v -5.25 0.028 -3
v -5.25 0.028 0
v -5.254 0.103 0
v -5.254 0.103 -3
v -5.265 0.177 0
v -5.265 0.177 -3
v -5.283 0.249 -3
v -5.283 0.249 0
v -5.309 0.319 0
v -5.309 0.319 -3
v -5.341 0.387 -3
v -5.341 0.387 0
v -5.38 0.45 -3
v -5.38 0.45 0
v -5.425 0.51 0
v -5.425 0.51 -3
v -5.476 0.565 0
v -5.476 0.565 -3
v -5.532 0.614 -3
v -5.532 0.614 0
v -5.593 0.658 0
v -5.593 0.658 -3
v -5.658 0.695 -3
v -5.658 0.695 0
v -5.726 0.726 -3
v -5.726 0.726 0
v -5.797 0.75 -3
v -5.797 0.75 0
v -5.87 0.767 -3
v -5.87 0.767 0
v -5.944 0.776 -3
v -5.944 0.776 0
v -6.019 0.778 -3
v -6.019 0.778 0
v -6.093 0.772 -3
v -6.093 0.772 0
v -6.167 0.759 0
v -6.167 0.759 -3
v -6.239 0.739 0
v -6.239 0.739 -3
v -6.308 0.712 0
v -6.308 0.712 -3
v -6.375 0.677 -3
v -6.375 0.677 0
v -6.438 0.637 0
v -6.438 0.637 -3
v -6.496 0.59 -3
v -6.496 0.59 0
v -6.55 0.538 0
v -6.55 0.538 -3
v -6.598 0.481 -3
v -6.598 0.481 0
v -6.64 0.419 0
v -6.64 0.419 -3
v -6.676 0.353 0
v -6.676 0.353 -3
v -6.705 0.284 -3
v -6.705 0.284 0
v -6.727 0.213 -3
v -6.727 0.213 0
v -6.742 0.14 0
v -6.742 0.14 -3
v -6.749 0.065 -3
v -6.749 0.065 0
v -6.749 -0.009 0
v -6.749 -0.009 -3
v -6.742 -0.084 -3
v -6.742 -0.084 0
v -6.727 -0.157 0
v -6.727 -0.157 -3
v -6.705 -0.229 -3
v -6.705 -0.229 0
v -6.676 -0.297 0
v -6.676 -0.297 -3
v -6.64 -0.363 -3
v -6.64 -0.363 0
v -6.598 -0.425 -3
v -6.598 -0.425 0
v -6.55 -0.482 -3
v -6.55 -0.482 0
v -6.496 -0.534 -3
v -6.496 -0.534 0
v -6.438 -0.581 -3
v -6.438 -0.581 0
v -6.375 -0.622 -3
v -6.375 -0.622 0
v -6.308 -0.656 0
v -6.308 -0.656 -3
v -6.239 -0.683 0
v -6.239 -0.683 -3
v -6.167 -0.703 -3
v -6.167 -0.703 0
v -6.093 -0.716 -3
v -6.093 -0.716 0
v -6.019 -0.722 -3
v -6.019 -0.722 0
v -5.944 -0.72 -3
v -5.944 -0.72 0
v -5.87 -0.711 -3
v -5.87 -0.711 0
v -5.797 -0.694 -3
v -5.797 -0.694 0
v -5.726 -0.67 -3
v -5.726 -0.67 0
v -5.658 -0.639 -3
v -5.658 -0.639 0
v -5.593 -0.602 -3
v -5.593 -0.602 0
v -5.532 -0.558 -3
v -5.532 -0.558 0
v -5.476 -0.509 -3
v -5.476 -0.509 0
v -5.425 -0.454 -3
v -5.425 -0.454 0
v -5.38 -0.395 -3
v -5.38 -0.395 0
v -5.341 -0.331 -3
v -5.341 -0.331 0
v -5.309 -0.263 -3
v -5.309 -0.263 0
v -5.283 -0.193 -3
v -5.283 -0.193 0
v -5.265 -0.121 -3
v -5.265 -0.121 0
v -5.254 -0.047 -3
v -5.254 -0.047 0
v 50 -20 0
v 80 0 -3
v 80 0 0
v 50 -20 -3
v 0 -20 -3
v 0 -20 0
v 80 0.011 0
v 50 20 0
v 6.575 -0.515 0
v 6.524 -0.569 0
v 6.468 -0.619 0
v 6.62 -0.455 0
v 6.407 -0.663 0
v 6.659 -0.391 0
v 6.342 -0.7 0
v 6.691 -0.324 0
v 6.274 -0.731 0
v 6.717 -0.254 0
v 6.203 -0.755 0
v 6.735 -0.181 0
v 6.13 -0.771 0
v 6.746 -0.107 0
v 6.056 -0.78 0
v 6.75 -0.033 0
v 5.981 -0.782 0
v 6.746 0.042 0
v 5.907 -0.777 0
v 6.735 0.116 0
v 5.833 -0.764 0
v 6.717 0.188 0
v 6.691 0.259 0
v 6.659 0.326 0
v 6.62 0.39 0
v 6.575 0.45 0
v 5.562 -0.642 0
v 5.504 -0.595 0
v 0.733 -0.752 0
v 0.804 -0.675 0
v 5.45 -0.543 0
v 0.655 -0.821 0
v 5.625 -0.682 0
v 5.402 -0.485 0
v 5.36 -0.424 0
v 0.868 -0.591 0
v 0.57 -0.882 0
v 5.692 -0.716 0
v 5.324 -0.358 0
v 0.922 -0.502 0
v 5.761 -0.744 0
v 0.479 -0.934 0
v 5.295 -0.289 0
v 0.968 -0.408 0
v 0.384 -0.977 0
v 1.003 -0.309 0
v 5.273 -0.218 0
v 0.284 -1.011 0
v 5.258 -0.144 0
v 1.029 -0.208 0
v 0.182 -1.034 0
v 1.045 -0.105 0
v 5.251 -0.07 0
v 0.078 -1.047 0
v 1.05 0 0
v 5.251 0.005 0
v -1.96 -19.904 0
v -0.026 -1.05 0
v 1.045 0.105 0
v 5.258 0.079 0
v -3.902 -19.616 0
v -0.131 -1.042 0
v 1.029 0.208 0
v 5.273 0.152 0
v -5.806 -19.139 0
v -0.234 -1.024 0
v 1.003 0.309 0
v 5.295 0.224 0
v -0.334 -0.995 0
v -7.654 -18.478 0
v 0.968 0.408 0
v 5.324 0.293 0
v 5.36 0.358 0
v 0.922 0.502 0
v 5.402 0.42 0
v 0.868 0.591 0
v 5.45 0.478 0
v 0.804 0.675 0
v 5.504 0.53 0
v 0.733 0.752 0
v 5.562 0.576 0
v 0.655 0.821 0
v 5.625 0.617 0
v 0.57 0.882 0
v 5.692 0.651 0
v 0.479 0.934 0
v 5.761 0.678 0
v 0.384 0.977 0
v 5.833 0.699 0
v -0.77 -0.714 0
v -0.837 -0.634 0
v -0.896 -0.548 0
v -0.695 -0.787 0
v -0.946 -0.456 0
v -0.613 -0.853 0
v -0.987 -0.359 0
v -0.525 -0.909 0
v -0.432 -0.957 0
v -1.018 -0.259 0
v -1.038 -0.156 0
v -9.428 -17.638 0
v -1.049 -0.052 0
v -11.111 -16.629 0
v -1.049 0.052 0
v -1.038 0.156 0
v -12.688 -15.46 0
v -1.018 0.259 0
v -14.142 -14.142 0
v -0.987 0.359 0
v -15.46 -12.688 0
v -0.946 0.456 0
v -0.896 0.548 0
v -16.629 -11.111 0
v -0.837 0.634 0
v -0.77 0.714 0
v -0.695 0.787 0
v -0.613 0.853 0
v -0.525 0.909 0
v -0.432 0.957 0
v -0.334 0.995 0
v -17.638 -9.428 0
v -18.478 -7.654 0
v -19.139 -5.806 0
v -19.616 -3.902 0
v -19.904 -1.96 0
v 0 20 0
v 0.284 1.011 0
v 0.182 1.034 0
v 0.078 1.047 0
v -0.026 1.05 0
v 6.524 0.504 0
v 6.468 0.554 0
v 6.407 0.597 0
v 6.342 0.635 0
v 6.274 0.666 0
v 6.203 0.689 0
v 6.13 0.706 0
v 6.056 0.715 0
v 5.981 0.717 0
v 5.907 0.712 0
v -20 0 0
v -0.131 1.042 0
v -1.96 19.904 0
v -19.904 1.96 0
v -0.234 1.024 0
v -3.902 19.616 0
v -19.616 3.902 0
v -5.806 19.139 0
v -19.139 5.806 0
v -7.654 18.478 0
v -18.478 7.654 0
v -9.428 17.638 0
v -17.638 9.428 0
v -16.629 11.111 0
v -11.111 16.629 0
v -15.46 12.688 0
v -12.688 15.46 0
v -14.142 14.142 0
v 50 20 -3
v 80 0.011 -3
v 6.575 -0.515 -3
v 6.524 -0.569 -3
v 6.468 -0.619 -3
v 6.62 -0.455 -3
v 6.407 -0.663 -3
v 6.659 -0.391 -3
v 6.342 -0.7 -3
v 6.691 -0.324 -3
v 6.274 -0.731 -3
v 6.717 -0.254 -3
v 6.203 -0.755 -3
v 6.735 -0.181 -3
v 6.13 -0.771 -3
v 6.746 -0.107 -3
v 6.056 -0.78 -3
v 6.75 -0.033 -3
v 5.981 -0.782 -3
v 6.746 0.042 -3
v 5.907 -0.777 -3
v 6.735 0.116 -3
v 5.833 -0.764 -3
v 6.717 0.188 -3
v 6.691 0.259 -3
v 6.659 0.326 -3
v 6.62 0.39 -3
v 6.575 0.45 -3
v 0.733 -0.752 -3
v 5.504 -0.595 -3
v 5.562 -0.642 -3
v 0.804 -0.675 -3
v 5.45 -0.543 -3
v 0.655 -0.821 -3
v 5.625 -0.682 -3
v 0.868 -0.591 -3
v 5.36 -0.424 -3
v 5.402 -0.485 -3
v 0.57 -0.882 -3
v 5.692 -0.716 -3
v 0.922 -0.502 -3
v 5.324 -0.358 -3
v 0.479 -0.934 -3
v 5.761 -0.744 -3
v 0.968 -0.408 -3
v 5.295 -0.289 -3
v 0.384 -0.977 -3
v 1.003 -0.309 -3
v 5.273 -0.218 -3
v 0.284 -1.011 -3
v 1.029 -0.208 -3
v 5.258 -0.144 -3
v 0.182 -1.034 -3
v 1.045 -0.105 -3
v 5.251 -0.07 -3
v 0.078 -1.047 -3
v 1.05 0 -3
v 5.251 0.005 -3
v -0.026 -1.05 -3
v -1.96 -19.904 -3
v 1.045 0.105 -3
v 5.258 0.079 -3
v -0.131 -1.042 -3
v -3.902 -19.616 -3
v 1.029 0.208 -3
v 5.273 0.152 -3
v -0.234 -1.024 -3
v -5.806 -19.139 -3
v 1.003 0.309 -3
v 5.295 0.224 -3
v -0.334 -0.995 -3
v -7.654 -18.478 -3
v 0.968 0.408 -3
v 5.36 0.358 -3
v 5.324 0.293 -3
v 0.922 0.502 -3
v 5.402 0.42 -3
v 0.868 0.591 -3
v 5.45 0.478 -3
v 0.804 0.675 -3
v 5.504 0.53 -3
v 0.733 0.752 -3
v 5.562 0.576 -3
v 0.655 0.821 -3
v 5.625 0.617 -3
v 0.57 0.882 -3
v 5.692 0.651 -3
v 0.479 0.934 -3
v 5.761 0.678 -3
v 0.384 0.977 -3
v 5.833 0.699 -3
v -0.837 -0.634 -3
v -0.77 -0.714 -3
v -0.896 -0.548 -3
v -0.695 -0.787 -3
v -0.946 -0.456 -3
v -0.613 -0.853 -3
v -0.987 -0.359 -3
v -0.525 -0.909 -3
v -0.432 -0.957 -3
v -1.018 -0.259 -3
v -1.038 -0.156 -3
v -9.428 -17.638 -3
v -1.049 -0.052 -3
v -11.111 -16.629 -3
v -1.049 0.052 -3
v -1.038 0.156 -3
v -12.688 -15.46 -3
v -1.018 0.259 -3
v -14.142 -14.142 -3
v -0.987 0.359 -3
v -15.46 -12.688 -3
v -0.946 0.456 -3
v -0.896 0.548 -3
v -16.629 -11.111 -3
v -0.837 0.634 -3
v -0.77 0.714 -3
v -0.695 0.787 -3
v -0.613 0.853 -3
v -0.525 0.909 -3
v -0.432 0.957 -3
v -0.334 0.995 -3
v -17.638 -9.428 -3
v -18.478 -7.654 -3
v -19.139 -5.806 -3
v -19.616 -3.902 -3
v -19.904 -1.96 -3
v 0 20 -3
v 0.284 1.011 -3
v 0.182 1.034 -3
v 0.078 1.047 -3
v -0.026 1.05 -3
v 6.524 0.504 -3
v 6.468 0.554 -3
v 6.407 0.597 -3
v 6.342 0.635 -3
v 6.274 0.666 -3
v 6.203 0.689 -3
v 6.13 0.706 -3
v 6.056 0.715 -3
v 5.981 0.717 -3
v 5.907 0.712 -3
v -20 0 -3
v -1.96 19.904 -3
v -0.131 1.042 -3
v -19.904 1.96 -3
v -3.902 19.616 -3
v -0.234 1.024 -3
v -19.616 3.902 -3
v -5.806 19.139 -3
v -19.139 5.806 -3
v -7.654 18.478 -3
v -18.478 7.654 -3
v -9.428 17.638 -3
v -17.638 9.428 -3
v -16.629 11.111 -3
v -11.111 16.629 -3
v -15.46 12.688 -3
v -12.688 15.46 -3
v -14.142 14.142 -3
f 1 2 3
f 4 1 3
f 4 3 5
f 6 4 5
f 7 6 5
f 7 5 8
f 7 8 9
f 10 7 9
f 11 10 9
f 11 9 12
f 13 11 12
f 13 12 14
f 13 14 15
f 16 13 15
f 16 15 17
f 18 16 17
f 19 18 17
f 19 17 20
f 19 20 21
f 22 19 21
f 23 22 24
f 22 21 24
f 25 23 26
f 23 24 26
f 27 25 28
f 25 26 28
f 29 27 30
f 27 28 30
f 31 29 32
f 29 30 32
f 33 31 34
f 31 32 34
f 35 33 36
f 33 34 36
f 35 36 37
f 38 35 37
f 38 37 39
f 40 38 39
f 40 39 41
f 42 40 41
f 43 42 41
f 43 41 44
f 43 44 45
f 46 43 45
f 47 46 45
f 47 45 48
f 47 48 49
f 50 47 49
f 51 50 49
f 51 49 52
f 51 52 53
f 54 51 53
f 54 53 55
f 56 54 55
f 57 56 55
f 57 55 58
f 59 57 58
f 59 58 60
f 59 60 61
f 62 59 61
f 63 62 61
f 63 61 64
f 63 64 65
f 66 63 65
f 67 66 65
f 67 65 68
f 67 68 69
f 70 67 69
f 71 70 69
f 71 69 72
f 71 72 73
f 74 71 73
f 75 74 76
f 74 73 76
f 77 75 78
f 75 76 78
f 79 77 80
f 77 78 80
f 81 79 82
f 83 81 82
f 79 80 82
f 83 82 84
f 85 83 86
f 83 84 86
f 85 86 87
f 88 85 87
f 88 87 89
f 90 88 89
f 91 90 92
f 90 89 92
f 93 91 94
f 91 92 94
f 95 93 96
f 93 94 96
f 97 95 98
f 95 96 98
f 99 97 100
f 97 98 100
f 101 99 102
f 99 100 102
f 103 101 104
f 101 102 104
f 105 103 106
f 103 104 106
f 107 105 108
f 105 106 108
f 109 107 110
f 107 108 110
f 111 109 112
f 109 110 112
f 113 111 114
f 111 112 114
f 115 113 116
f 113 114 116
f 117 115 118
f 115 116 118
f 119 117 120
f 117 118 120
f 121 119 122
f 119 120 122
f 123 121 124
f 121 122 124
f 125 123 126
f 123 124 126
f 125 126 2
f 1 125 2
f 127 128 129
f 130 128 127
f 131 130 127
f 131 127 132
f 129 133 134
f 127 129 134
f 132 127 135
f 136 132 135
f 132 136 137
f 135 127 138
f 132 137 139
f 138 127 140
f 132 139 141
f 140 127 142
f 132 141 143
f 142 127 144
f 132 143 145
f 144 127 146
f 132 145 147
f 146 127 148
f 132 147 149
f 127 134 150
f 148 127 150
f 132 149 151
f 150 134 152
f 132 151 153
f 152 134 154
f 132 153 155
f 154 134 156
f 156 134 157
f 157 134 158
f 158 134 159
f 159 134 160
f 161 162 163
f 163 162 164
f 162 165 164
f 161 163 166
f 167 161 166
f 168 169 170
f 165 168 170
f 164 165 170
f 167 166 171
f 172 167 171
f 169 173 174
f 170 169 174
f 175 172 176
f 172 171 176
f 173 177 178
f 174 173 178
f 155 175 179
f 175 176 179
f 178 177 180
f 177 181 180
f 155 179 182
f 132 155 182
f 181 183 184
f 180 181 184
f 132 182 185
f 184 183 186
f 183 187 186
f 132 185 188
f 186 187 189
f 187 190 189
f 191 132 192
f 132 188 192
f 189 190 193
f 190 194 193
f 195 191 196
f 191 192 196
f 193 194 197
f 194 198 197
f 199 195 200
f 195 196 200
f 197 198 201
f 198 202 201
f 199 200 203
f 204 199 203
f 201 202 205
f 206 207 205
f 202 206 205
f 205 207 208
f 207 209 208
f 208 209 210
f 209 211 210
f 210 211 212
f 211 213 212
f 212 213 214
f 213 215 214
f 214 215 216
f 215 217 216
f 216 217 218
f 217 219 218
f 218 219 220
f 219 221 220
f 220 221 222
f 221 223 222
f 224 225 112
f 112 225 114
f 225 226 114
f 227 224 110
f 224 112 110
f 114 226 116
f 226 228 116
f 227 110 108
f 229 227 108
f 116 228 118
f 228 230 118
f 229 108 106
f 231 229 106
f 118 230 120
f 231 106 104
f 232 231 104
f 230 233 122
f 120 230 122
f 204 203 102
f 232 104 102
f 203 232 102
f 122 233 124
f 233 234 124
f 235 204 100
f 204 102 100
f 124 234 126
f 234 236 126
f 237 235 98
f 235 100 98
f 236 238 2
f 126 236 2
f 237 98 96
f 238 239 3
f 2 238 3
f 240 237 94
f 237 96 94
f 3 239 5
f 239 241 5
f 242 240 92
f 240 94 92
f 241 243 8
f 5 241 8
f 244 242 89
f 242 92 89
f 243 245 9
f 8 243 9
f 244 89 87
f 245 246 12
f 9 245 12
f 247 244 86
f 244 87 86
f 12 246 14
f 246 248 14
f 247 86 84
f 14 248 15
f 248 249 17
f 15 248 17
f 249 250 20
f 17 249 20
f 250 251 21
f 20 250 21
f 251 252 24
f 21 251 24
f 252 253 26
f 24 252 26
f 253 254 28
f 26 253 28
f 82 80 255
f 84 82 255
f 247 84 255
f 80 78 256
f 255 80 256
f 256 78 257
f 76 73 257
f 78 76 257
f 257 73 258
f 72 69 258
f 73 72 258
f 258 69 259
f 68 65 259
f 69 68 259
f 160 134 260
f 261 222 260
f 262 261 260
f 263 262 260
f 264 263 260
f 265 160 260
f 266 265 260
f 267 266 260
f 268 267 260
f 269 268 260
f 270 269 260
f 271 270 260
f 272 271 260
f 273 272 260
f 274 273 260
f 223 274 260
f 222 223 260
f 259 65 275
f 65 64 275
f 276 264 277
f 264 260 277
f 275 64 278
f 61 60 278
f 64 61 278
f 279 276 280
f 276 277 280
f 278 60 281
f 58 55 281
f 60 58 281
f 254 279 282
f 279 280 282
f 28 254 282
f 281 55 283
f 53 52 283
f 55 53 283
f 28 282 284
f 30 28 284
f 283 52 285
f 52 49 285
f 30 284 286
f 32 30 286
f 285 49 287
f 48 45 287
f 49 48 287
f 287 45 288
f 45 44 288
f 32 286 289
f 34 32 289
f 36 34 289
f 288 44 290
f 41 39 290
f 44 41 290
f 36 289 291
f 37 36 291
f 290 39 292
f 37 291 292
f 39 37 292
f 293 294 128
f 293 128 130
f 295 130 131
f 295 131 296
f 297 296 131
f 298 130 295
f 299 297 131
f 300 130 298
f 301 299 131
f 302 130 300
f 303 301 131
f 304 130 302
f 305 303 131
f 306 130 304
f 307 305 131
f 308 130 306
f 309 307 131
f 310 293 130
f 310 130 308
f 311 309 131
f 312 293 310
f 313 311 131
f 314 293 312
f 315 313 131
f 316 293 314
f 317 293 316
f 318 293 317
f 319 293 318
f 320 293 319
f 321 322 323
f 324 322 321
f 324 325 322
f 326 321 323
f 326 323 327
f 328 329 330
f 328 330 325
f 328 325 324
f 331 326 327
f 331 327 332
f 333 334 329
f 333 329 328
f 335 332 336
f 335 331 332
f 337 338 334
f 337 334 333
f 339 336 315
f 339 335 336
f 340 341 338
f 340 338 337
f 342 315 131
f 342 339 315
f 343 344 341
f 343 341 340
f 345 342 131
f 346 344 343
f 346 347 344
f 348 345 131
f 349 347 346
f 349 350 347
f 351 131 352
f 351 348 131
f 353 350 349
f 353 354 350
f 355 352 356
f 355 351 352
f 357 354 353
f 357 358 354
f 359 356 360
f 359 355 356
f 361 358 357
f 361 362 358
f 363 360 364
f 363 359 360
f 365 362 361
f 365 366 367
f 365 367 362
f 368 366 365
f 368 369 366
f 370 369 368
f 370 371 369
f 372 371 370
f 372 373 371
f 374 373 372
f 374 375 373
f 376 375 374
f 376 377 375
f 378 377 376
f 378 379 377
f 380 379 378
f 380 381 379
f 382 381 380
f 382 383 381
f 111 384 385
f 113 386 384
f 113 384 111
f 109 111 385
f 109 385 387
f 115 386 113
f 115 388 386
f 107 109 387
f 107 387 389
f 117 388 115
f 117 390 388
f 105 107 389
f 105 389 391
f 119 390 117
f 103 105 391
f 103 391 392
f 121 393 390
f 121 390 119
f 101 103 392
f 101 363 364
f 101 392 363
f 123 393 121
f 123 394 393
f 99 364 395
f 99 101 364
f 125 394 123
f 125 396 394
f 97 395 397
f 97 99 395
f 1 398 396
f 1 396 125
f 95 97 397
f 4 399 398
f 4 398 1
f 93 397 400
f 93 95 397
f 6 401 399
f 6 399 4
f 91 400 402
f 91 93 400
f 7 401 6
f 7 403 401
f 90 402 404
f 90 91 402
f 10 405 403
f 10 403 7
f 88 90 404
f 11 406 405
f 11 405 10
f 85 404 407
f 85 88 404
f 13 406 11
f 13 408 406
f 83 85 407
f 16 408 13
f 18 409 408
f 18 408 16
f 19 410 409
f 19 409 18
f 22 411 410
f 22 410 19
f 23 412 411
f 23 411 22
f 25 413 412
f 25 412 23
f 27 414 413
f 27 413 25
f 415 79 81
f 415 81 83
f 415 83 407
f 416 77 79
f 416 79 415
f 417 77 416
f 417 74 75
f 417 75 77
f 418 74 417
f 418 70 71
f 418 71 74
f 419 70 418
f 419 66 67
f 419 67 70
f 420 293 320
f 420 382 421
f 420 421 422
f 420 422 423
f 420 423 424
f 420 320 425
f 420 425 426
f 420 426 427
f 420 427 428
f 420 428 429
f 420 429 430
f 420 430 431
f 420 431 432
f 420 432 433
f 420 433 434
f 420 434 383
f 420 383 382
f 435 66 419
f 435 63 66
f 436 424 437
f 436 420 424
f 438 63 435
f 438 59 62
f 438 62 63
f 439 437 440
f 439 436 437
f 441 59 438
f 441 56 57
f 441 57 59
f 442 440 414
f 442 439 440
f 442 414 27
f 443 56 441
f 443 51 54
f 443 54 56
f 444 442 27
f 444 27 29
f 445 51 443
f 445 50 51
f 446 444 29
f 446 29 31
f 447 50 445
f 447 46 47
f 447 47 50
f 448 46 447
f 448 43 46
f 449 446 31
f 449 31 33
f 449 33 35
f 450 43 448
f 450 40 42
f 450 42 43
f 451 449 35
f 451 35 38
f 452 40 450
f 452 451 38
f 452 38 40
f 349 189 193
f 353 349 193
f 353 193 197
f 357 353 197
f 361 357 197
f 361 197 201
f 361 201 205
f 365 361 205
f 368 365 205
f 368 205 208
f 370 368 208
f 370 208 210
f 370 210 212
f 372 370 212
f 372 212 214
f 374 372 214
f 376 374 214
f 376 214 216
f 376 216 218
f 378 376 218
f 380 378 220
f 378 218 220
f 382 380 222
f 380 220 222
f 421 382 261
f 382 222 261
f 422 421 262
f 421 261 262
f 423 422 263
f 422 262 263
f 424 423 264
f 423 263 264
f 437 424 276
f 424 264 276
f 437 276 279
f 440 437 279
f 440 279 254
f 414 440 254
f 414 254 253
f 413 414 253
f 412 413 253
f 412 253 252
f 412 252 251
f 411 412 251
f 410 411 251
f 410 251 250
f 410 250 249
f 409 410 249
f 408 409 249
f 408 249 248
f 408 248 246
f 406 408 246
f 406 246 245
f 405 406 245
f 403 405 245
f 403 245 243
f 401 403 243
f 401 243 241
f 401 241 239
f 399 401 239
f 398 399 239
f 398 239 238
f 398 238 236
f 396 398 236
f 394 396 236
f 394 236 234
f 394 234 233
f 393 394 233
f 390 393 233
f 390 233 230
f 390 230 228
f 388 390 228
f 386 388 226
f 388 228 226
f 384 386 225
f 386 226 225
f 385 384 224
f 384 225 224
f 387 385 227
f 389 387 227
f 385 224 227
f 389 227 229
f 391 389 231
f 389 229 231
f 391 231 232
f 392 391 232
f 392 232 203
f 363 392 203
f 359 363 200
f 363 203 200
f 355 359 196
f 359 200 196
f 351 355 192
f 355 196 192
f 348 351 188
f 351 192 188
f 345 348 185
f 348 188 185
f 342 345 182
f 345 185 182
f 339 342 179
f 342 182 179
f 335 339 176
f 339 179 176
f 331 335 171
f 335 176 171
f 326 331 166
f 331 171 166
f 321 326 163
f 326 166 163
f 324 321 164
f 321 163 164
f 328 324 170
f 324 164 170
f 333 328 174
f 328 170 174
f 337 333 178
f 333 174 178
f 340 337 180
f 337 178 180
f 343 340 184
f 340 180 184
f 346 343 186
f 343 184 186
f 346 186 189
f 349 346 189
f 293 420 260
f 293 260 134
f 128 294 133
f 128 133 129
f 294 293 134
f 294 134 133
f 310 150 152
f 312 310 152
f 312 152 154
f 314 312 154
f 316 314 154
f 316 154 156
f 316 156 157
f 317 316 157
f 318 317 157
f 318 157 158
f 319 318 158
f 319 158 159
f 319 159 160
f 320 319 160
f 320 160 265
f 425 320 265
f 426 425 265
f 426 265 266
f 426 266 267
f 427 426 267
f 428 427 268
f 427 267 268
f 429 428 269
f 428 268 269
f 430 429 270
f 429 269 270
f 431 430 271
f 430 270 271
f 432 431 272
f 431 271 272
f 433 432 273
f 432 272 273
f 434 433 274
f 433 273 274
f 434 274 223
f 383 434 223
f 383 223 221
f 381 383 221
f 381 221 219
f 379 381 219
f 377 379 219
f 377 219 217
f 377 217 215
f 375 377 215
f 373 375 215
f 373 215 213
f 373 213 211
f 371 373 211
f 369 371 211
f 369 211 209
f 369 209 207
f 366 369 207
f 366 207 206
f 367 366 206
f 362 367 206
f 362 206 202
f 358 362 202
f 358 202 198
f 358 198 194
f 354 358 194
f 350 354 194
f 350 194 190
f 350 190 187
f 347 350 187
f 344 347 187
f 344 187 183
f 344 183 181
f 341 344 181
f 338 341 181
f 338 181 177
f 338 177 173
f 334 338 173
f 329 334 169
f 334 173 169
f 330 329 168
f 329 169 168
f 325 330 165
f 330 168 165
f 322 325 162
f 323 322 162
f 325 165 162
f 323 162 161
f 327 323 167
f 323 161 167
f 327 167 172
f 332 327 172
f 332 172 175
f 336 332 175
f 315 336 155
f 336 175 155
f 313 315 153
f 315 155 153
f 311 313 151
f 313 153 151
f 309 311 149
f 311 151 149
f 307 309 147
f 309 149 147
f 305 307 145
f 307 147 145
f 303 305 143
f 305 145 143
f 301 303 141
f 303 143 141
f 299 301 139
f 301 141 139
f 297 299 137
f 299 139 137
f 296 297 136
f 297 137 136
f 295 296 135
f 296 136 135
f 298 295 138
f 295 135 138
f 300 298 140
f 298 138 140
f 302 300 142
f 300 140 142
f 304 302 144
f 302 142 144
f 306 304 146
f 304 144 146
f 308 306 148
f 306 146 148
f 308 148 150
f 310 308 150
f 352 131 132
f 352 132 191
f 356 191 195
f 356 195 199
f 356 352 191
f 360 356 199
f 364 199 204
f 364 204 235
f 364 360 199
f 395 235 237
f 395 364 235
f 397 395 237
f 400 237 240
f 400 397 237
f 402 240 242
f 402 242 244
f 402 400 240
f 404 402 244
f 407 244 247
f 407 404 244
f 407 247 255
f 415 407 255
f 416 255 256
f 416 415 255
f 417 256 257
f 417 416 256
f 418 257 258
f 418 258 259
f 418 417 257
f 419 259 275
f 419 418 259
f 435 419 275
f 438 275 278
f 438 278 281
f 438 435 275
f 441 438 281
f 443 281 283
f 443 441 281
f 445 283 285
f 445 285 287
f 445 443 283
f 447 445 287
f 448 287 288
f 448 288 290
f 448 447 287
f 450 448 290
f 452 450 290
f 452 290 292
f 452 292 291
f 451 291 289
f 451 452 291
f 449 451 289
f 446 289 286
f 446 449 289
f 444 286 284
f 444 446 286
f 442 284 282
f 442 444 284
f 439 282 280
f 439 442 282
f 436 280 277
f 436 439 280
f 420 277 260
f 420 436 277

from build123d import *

# Parameters (mm, degrees)
BOSS_EXTRUDE1_DEPTH   = 3
BODY_MOVE_COPY1_ANGLE = 90
CUT_EXTRUDE2_REACH    = 84.517
SKETCH8_R             = 1.05
SKETCH8_R_2           = 0.75


with BuildPart() as part:
    # Sketch1 → Boss-Extrude1 (new body)
    with BuildSketch(Plane(origin=(0, 0, 0), x_dir=(1, 0, 0), z_dir=(0, 1, 0))):
        with BuildLine():
            Line((50, -20), (0, -20))
            ThreePointArc((0, -20), (-20, 0), (0, 20))
            Line((0, 20), (50, 20))
            Line((50, 20), (80, 0.010830805))
            Line((80, 0.010830805), (80, 0))
            Line((80, 0), (50, -20))
        make_face()
    extrude(amount=BOSS_EXTRUDE1_DEPTH)


with BuildPart() as part_1:
    # Body-Move/Copy1: moved
    add(part.part.rotate(Axis((0, 0, 0), (1, 0, 0)), BODY_MOVE_COPY1_ANGLE))

    # Sketch8 → Cut-Extrude2 (cut, up to next)
    with BuildSketch(Plane.XY.offset(3), mode=Mode.PRIVATE) as cut_extrude2_sk1:
        Circle(SKETCH8_R)
    cut_extrude2_tool1 = extrude(cut_extrude2_sk1.sketch, amount=-CUT_EXTRUDE2_REACH, mode=Mode.PRIVATE) & part_1.part
    # Sketch8 → Cut-Extrude2 (cut, up to next)
    with BuildSketch(Plane.XY.offset(3), mode=Mode.PRIVATE) as cut_extrude2_sk2:
        with Locations((6, -0.032589943)):
            Circle(SKETCH8_R_2)
    cut_extrude2_tool2 = extrude(cut_extrude2_sk2.sketch, amount=-CUT_EXTRUDE2_REACH, mode=Mode.PRIVATE) & part_1.part
    # Sketch8 → Cut-Extrude2 (cut, up to next)
    with BuildSketch(Plane.XY.offset(3), mode=Mode.PRIVATE) as cut_extrude2_sk3:
        with Locations((-5.999934973, 0.027934237)):
            Circle(SKETCH8_R_2)
    cut_extrude2_tool3 = extrude(cut_extrude2_sk3.sketch, amount=-CUT_EXTRUDE2_REACH, mode=Mode.PRIVATE) & part_1.part
    add(cut_extrude2_tool1.solids().sort_by_distance((0, 0, 3))[0], mode=Mode.SUBTRACT)
    add(cut_extrude2_tool2.solids().sort_by_distance((6, -0.03259, 3))[0], mode=Mode.SUBTRACT)
    add(cut_extrude2_tool3.solids().sort_by_distance((-5.999935, 0.027934, 3))[0], mode=Mode.SUBTRACT)


with BuildPart() as part_2:
    # Body-Move/Copy4: moved
    add(part_1.part.moved(Location((0, 0, -3))))


solid = part_2.part
